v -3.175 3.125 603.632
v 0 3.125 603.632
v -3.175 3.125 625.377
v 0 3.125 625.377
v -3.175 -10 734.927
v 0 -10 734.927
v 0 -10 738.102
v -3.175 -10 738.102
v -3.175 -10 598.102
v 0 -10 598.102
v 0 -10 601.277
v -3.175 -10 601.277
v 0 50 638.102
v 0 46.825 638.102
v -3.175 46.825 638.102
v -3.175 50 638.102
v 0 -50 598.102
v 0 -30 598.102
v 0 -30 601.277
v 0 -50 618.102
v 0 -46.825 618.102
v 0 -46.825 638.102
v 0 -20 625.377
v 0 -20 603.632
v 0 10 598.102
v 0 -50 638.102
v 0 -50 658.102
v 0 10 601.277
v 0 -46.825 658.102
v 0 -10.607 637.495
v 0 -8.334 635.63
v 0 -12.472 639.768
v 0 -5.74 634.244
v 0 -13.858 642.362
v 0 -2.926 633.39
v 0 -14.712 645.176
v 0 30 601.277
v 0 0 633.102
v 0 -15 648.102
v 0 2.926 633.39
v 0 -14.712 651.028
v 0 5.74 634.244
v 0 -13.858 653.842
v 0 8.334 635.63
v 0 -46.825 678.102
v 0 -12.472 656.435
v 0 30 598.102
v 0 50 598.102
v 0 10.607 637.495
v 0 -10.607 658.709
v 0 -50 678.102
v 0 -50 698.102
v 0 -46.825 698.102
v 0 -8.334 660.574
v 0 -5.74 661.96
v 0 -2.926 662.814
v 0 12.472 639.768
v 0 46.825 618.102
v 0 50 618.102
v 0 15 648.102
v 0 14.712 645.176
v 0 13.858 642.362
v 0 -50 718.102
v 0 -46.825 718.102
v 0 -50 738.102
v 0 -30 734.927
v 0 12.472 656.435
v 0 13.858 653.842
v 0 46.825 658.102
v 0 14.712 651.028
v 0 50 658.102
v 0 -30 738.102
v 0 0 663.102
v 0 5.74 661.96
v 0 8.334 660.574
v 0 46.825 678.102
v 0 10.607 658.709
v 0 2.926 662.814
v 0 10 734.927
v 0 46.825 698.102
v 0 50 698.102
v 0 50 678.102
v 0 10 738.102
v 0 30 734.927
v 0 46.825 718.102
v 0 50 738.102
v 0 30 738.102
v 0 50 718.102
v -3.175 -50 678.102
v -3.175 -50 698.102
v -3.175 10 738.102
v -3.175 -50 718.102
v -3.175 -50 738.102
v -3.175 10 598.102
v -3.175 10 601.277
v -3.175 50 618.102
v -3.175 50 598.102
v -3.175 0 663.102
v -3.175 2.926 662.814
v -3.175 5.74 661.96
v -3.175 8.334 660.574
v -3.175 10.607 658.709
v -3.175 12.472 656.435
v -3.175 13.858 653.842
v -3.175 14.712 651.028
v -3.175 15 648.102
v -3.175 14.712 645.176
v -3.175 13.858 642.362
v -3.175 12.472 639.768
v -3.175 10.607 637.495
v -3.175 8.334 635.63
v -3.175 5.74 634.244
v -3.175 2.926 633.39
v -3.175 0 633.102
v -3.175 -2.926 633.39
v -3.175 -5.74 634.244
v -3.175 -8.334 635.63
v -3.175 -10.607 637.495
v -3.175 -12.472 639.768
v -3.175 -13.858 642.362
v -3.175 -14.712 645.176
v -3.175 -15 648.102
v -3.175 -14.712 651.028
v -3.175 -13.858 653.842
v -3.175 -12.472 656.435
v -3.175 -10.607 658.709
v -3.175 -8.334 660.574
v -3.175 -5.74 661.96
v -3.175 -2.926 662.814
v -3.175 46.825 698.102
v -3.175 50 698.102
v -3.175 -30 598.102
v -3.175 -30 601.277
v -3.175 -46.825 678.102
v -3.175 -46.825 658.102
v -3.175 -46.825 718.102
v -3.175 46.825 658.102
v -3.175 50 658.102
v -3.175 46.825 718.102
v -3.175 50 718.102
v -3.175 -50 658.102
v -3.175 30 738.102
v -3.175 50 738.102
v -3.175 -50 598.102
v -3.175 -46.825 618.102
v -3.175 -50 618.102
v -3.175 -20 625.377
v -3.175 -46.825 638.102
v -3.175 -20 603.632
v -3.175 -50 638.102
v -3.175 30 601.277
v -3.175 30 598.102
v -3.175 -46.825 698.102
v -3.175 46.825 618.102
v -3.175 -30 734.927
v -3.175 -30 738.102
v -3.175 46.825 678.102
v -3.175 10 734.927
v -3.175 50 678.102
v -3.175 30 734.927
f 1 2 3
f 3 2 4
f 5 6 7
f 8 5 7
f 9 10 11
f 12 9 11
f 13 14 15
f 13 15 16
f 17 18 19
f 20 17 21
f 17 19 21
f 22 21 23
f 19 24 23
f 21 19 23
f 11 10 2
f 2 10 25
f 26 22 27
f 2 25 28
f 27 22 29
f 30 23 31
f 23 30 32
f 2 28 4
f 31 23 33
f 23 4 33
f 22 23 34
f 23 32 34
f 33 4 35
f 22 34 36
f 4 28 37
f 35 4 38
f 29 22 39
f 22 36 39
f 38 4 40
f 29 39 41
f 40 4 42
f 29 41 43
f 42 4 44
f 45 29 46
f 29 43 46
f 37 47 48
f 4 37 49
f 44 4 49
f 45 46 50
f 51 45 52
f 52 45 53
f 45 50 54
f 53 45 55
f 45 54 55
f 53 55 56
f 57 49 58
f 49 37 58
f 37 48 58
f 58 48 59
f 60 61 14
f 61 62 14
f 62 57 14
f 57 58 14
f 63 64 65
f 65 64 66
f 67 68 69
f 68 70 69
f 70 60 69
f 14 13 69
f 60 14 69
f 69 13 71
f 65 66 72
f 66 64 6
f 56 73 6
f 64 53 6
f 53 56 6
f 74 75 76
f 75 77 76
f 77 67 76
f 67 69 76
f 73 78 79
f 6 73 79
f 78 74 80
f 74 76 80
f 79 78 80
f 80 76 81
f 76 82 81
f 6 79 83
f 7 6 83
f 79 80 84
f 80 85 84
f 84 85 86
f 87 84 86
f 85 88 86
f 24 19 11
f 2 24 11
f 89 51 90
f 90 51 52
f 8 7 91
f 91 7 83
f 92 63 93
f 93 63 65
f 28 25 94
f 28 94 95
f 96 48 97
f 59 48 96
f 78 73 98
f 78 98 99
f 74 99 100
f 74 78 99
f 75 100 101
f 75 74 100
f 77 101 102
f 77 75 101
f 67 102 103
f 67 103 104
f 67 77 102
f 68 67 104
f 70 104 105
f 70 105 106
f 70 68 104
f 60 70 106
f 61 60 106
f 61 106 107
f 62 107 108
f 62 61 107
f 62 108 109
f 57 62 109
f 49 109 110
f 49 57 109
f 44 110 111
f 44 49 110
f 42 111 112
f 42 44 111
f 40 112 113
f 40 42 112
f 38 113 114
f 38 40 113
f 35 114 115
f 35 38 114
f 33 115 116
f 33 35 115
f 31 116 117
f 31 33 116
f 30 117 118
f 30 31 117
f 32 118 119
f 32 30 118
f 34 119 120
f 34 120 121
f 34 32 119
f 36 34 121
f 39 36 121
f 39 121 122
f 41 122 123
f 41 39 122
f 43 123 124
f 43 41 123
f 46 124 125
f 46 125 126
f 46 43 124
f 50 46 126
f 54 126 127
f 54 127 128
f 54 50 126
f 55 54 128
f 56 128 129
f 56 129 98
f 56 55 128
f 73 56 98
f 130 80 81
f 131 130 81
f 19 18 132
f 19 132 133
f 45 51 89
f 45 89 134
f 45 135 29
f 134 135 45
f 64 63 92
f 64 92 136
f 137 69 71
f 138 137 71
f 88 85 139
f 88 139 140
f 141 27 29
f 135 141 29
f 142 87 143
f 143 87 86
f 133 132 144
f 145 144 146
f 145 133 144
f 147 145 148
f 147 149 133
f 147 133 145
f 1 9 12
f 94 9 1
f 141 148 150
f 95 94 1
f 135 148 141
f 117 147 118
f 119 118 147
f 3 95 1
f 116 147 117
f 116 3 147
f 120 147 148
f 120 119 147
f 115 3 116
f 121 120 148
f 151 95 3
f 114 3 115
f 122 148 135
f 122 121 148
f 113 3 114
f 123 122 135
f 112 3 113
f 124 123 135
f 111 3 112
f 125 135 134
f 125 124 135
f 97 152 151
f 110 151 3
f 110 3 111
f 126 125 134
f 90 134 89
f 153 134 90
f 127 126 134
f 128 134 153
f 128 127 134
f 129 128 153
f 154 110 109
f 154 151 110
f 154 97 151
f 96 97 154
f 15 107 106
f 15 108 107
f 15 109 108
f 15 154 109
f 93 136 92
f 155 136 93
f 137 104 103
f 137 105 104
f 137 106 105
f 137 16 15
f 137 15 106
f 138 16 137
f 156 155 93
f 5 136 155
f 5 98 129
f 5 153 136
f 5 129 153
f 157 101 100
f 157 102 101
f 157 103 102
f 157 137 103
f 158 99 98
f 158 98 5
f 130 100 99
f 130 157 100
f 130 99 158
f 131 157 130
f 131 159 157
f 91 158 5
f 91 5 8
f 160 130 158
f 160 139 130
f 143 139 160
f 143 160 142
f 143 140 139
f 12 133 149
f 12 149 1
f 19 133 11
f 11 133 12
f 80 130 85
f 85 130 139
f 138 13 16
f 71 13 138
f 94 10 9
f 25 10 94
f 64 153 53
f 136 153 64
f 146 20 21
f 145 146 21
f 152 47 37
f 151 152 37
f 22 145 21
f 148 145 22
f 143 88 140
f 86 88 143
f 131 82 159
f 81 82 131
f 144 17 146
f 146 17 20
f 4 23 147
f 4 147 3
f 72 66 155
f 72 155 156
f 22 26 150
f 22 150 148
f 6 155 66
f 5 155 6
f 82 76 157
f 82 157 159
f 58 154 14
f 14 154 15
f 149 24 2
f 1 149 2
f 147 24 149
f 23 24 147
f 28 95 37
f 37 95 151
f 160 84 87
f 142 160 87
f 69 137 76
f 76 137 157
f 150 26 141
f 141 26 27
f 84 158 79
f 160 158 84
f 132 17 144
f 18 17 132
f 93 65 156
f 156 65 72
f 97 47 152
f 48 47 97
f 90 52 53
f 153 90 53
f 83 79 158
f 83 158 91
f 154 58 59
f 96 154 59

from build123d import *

# Parameters (mm, degrees)
SKETCH46_W           = 140
SKETCH46_H           = 99.999981374
SKETCH46_R           = 15
SKETCH46_W_2         = 21.745
SKETCH46_H_2         = 23.125
BOSS_EXTRUDE11_DEPTH = 3.175
SKETCH47_W           = 3.175
SKETCH47_H           = 20
SKETCH47_W_2         = 20
SKETCH47_H_2         = 3.175
CUT_EXTRUDE23_DEPTH  = 3.175


with BuildPart() as part:
    # Sketch46 → Boss-Extrude11 (new body)
    with BuildSketch(Plane.ZY):
        with Locations((668.101928689, 4.4643e-05)):
            Rectangle(SKETCH46_W, SKETCH46_H)
        with Locations((648.101928689, 4.4643e-05)):
            Circle(SKETCH46_R, mode=Mode.SUBTRACT)
        with Locations((614.504428689, -8.437455357)):
            Rectangle(SKETCH46_W_2, SKETCH46_H_2, mode=Mode.SUBTRACT)
    extrude(amount=BOSS_EXTRUDE11_DEPTH)

    # Sketch47 → Cut-Extrude23 (cut)
    with BuildSketch(Plane.ZY.offset(3.175)):
        with Locations((736.514428689, -19.99996467)):
            Rectangle(SKETCH47_W, SKETCH47_H)
        with Locations((736.514428689, 20.00003533)):
            Rectangle(SKETCH47_W, SKETCH47_H)
        with Locations((599.689428689, -19.99996467)):
            Rectangle(SKETCH47_W, SKETCH47_H)
        with Locations((599.689428689, 20.00003533)):
            Rectangle(SKETCH47_W, SKETCH47_H)
        with Locations((668.101928689, 48.41253533)):
            Rectangle(SKETCH47_W_2, SKETCH47_H_2)
        with Locations((708.101928689, 48.41253533)):
            Rectangle(SKETCH47_W_2, SKETCH47_H_2)
        with Locations((628.101928689, 48.41253533)):
            Rectangle(SKETCH47_W_2, SKETCH47_H_2)
        with Locations((668.101928689, -48.412446044)):
            Rectangle(SKETCH47_W_2, SKETCH47_H_2)
        with Locations((708.101928689, -48.412446044)):
            Rectangle(SKETCH47_W_2, SKETCH47_H_2)
        with Locations((628.101928689, -48.412446044)):
            Rectangle(SKETCH47_W_2, SKETCH47_H_2)
    extrude(amount=-CUT_EXTRUDE23_DEPTH, mode=Mode.SUBTRACT)


solid = part.part
